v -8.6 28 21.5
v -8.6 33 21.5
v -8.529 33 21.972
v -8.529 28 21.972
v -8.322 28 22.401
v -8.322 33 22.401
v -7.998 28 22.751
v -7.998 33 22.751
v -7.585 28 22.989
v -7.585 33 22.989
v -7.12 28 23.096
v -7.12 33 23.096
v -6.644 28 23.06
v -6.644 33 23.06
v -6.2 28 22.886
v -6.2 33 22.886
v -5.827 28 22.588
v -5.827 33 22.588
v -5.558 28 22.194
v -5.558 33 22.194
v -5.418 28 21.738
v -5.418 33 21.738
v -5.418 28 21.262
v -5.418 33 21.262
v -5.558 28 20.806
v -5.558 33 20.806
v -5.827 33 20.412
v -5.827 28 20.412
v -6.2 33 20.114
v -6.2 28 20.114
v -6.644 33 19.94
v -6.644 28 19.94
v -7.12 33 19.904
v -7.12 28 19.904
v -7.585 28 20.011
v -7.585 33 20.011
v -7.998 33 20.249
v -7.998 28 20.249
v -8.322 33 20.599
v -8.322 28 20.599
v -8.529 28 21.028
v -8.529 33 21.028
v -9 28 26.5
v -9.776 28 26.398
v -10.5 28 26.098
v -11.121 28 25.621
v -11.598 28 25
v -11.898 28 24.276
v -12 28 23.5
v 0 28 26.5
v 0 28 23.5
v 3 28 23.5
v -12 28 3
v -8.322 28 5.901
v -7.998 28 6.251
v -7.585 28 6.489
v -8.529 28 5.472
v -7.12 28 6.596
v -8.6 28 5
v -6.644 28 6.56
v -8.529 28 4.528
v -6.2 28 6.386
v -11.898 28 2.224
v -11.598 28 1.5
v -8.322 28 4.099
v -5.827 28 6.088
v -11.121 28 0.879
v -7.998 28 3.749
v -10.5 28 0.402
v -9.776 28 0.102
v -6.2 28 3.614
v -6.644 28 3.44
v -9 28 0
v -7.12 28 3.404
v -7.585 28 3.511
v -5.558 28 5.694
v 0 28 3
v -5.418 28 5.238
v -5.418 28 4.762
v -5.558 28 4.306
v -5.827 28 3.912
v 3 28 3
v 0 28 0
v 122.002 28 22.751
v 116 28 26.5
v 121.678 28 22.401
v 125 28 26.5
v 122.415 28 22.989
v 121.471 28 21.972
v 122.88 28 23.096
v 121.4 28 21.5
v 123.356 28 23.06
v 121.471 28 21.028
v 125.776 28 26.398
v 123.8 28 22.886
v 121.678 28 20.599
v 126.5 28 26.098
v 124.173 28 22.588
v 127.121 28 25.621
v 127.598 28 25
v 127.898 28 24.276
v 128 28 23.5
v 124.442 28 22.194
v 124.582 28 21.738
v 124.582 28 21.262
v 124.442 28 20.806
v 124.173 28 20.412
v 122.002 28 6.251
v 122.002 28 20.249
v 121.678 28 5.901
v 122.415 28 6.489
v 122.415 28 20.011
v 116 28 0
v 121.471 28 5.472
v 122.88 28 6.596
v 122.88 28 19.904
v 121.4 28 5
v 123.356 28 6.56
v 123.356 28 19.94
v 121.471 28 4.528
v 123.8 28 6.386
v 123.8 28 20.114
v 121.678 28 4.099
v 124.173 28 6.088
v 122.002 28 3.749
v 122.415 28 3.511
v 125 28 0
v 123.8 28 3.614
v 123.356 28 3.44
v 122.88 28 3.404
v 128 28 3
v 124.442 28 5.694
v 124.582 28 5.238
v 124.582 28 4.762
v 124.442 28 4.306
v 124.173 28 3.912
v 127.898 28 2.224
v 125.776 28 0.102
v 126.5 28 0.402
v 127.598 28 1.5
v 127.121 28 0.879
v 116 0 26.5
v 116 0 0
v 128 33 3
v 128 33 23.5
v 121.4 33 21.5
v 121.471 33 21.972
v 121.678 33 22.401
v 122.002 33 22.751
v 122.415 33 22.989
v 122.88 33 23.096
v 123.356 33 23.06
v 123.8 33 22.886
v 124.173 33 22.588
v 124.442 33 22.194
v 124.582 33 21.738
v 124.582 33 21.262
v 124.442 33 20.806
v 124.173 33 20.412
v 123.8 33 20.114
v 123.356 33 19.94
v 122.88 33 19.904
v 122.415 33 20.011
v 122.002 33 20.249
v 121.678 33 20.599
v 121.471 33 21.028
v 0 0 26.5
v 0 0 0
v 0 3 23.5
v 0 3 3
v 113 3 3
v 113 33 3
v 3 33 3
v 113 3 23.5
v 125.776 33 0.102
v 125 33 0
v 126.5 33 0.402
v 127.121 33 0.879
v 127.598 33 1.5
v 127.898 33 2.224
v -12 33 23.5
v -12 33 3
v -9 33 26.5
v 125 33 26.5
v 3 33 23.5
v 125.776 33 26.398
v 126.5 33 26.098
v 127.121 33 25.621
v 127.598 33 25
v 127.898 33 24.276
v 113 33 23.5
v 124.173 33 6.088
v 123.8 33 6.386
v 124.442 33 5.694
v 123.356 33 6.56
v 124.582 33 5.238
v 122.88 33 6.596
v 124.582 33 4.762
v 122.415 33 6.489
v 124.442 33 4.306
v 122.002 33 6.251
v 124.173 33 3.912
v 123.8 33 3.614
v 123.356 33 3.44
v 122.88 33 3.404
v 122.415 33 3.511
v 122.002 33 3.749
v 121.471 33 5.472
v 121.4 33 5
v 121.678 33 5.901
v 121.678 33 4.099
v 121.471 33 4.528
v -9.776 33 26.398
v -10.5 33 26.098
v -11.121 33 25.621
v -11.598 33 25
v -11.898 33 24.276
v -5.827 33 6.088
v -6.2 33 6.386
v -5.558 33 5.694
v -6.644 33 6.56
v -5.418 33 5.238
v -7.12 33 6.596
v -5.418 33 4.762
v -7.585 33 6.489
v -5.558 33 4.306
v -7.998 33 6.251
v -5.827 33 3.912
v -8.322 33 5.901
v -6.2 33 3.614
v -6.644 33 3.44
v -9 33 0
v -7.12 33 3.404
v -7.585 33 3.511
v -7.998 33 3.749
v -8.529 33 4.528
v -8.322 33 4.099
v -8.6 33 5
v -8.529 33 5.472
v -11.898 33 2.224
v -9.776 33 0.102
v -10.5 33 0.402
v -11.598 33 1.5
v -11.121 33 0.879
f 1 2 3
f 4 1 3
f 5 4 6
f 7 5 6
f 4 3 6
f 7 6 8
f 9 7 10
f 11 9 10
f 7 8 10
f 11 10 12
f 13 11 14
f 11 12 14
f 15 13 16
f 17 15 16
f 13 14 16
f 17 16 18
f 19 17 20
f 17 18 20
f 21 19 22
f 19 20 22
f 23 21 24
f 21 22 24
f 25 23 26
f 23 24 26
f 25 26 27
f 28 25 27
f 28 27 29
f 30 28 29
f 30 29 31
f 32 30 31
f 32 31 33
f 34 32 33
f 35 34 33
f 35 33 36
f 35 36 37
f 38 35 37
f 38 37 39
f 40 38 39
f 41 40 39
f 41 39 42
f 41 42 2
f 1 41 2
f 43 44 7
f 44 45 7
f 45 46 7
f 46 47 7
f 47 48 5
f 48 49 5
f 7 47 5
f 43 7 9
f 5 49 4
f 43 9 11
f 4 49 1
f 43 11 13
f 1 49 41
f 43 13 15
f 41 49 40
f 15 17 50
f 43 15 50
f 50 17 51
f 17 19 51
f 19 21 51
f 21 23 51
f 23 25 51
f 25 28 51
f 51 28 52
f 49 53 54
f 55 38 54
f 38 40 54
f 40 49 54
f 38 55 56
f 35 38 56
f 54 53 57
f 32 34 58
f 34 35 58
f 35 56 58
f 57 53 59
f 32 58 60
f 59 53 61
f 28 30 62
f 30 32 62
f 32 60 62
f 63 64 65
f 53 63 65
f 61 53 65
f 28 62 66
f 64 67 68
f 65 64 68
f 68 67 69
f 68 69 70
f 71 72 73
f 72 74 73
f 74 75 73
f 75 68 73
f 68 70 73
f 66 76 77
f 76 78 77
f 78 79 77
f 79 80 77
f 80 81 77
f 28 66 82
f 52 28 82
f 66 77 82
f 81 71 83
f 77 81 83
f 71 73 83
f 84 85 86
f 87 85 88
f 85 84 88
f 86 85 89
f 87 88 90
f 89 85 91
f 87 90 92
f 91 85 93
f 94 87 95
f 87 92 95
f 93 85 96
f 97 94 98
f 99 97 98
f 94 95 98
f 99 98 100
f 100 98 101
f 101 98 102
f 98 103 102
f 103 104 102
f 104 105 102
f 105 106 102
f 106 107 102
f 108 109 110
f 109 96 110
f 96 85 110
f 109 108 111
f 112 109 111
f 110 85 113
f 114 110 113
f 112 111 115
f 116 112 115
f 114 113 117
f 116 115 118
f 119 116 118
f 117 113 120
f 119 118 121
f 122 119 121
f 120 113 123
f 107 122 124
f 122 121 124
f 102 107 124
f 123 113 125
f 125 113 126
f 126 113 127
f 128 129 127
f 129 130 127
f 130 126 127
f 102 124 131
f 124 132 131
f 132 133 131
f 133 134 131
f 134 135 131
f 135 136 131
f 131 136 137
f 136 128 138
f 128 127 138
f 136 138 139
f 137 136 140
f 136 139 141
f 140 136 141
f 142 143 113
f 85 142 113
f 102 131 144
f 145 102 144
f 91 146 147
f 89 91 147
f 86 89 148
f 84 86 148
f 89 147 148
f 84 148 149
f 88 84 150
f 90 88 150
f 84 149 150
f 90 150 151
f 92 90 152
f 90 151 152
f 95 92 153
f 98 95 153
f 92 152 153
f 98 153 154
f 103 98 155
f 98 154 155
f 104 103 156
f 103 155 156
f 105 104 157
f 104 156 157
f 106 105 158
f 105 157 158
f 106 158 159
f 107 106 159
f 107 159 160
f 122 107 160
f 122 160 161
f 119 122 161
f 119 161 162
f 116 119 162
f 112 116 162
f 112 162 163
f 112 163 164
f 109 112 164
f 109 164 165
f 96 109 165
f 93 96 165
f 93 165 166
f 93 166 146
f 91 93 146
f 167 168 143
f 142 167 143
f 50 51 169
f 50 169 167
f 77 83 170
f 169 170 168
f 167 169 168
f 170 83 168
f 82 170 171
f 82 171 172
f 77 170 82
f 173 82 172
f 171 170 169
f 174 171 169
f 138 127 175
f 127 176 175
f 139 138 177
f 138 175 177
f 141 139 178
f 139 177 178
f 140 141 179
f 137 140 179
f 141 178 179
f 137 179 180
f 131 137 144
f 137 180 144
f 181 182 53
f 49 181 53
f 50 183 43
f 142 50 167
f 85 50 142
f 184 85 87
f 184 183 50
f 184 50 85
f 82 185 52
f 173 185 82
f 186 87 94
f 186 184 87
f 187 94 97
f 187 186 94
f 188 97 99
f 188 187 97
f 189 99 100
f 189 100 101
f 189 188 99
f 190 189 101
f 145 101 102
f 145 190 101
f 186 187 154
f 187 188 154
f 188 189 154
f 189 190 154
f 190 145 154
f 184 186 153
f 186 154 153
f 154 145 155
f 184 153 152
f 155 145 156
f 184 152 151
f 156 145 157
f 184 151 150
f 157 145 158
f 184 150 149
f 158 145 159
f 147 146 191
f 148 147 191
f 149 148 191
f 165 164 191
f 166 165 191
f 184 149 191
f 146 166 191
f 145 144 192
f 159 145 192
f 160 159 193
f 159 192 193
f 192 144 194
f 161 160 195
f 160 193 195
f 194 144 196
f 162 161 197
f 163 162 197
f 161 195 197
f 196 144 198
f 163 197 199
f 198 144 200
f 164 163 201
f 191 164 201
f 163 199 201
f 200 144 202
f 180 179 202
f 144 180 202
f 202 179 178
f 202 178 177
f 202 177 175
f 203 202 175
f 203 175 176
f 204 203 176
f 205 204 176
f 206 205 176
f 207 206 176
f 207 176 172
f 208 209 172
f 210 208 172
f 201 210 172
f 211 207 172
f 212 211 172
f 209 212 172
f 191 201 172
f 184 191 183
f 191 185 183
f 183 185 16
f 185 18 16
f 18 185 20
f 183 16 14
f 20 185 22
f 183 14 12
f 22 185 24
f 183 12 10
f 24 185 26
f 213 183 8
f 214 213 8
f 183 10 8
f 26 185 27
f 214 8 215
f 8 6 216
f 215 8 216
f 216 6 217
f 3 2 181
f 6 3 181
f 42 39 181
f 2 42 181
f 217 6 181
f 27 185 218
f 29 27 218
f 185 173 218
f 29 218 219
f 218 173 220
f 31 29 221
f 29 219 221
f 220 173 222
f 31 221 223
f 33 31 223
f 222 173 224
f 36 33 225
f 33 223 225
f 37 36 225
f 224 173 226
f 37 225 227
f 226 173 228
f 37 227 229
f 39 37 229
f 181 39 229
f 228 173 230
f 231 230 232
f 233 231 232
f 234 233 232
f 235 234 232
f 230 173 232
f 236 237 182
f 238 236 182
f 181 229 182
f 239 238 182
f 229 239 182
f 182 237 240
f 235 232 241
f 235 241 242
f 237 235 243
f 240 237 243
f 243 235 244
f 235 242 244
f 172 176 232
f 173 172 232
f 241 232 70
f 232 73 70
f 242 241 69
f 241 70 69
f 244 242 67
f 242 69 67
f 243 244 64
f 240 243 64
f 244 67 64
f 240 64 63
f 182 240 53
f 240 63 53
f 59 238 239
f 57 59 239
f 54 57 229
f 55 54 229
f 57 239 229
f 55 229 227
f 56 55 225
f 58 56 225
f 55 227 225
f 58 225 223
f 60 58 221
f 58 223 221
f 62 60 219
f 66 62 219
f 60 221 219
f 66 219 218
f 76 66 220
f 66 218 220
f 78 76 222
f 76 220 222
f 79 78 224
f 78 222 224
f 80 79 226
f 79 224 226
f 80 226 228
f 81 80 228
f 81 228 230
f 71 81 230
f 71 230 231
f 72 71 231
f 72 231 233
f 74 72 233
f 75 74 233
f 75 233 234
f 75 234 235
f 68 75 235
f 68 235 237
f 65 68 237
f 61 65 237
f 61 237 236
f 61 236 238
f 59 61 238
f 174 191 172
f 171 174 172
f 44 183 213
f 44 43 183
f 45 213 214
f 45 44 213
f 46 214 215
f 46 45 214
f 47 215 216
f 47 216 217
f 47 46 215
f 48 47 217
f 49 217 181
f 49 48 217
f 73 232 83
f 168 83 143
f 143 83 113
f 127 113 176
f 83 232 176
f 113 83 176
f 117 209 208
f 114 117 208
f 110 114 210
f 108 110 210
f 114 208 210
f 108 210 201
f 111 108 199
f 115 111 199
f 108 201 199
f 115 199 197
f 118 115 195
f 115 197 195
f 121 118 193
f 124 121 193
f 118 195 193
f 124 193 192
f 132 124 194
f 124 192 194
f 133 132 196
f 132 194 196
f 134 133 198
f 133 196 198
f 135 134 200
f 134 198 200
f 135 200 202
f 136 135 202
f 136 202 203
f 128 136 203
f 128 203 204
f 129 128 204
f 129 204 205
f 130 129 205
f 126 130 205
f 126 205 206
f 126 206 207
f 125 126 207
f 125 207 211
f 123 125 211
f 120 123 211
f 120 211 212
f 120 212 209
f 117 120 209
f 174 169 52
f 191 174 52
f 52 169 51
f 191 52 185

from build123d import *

# Parameters (mm, degrees)
DODANIE_WYCI_GNI_CIE1_DEPTH = 26.5
SZKIC2_W                    = 110
SZKIC2_H                    = 20.5
WYTNIJ_WYCI_GNI_CIE1_DEPTH  = 30
SZKIC4_W                    = 20.5
SZKIC4_H                    = 25
WYTNIJ_WYCI_GNI_CIE3_DEPTH  = 3
SZKIC5_R                    = 1.6
WYTNIJ_WYCI_GNI_CIE4_DEPTH  = 135.815614823
FILLET1_R                   = 3


with BuildPart() as part:
    # Szkic1 → Dodanie-wyciągnięcie1 (new body)
    with BuildSketch(Plane.XY):
        Polygon((0, 0), (116, 0), (116, 28), (128, 28), (128, 33), (-12, 33), (-12, 28), (0, 28), align=None)
    extrude(amount=DODANIE_WYCI_GNI_CIE1_DEPTH)

    # Szkic2 → Wytnij-wyciągnięcie1 (cut)
    with BuildSketch(Plane(origin=(0, 33, 0), x_dir=(1, 0, 0), z_dir=(0, 1, 0))):
        with Locations((58, -13.25)):
            Rectangle(SZKIC2_W, SZKIC2_H)
    extrude(amount=-WYTNIJ_WYCI_GNI_CIE1_DEPTH, mode=Mode.SUBTRACT)

    # Szkic4 → Wytnij-wyciągnięcie3 (cut)
    with BuildSketch(Plane.ZY):
        with Locations((13.25, 15.5)):
            Rectangle(SZKIC4_W, SZKIC4_H)
    extrude(amount=-WYTNIJ_WYCI_GNI_CIE3_DEPTH, mode=Mode.SUBTRACT)

    # Szkic5 → Wytnij-wyciągnięcie4 (cut, through all)
    with BuildSketch(Plane(origin=(0, 33, 0), x_dir=(1, 0, 0), z_dir=(0, 1, 0))):
        with Locations(Location((-7, -5, 0), (0, 0, 180))):
            Circle(SZKIC5_R)
        with Locations(Location((123, -5, 0), (0, 0, 180))):
            Circle(SZKIC5_R)
        with Locations(Location((123, -21.5, 0), (0, 0, 180))):
            Circle(SZKIC5_R)
        with Locations(Location((-7, -21.5, 0), (0, 0, 180))):
            Circle(SZKIC5_R)
    extrude(amount=-WYTNIJ_WYCI_GNI_CIE4_DEPTH, mode=Mode.SUBTRACT)

    # Fillet1
    fillet1_edges = [part.edges().sort_by_distance(p)[0] for p in [
        (128, 30.5, 26.5),
        (-12, 30.5, 26.5),
        (-12, 30.5, 0),
        (128, 30.5, 0),
    ]]
    fillet(fillet1_edges, radius=FILLET1_R)


solid = part.part
